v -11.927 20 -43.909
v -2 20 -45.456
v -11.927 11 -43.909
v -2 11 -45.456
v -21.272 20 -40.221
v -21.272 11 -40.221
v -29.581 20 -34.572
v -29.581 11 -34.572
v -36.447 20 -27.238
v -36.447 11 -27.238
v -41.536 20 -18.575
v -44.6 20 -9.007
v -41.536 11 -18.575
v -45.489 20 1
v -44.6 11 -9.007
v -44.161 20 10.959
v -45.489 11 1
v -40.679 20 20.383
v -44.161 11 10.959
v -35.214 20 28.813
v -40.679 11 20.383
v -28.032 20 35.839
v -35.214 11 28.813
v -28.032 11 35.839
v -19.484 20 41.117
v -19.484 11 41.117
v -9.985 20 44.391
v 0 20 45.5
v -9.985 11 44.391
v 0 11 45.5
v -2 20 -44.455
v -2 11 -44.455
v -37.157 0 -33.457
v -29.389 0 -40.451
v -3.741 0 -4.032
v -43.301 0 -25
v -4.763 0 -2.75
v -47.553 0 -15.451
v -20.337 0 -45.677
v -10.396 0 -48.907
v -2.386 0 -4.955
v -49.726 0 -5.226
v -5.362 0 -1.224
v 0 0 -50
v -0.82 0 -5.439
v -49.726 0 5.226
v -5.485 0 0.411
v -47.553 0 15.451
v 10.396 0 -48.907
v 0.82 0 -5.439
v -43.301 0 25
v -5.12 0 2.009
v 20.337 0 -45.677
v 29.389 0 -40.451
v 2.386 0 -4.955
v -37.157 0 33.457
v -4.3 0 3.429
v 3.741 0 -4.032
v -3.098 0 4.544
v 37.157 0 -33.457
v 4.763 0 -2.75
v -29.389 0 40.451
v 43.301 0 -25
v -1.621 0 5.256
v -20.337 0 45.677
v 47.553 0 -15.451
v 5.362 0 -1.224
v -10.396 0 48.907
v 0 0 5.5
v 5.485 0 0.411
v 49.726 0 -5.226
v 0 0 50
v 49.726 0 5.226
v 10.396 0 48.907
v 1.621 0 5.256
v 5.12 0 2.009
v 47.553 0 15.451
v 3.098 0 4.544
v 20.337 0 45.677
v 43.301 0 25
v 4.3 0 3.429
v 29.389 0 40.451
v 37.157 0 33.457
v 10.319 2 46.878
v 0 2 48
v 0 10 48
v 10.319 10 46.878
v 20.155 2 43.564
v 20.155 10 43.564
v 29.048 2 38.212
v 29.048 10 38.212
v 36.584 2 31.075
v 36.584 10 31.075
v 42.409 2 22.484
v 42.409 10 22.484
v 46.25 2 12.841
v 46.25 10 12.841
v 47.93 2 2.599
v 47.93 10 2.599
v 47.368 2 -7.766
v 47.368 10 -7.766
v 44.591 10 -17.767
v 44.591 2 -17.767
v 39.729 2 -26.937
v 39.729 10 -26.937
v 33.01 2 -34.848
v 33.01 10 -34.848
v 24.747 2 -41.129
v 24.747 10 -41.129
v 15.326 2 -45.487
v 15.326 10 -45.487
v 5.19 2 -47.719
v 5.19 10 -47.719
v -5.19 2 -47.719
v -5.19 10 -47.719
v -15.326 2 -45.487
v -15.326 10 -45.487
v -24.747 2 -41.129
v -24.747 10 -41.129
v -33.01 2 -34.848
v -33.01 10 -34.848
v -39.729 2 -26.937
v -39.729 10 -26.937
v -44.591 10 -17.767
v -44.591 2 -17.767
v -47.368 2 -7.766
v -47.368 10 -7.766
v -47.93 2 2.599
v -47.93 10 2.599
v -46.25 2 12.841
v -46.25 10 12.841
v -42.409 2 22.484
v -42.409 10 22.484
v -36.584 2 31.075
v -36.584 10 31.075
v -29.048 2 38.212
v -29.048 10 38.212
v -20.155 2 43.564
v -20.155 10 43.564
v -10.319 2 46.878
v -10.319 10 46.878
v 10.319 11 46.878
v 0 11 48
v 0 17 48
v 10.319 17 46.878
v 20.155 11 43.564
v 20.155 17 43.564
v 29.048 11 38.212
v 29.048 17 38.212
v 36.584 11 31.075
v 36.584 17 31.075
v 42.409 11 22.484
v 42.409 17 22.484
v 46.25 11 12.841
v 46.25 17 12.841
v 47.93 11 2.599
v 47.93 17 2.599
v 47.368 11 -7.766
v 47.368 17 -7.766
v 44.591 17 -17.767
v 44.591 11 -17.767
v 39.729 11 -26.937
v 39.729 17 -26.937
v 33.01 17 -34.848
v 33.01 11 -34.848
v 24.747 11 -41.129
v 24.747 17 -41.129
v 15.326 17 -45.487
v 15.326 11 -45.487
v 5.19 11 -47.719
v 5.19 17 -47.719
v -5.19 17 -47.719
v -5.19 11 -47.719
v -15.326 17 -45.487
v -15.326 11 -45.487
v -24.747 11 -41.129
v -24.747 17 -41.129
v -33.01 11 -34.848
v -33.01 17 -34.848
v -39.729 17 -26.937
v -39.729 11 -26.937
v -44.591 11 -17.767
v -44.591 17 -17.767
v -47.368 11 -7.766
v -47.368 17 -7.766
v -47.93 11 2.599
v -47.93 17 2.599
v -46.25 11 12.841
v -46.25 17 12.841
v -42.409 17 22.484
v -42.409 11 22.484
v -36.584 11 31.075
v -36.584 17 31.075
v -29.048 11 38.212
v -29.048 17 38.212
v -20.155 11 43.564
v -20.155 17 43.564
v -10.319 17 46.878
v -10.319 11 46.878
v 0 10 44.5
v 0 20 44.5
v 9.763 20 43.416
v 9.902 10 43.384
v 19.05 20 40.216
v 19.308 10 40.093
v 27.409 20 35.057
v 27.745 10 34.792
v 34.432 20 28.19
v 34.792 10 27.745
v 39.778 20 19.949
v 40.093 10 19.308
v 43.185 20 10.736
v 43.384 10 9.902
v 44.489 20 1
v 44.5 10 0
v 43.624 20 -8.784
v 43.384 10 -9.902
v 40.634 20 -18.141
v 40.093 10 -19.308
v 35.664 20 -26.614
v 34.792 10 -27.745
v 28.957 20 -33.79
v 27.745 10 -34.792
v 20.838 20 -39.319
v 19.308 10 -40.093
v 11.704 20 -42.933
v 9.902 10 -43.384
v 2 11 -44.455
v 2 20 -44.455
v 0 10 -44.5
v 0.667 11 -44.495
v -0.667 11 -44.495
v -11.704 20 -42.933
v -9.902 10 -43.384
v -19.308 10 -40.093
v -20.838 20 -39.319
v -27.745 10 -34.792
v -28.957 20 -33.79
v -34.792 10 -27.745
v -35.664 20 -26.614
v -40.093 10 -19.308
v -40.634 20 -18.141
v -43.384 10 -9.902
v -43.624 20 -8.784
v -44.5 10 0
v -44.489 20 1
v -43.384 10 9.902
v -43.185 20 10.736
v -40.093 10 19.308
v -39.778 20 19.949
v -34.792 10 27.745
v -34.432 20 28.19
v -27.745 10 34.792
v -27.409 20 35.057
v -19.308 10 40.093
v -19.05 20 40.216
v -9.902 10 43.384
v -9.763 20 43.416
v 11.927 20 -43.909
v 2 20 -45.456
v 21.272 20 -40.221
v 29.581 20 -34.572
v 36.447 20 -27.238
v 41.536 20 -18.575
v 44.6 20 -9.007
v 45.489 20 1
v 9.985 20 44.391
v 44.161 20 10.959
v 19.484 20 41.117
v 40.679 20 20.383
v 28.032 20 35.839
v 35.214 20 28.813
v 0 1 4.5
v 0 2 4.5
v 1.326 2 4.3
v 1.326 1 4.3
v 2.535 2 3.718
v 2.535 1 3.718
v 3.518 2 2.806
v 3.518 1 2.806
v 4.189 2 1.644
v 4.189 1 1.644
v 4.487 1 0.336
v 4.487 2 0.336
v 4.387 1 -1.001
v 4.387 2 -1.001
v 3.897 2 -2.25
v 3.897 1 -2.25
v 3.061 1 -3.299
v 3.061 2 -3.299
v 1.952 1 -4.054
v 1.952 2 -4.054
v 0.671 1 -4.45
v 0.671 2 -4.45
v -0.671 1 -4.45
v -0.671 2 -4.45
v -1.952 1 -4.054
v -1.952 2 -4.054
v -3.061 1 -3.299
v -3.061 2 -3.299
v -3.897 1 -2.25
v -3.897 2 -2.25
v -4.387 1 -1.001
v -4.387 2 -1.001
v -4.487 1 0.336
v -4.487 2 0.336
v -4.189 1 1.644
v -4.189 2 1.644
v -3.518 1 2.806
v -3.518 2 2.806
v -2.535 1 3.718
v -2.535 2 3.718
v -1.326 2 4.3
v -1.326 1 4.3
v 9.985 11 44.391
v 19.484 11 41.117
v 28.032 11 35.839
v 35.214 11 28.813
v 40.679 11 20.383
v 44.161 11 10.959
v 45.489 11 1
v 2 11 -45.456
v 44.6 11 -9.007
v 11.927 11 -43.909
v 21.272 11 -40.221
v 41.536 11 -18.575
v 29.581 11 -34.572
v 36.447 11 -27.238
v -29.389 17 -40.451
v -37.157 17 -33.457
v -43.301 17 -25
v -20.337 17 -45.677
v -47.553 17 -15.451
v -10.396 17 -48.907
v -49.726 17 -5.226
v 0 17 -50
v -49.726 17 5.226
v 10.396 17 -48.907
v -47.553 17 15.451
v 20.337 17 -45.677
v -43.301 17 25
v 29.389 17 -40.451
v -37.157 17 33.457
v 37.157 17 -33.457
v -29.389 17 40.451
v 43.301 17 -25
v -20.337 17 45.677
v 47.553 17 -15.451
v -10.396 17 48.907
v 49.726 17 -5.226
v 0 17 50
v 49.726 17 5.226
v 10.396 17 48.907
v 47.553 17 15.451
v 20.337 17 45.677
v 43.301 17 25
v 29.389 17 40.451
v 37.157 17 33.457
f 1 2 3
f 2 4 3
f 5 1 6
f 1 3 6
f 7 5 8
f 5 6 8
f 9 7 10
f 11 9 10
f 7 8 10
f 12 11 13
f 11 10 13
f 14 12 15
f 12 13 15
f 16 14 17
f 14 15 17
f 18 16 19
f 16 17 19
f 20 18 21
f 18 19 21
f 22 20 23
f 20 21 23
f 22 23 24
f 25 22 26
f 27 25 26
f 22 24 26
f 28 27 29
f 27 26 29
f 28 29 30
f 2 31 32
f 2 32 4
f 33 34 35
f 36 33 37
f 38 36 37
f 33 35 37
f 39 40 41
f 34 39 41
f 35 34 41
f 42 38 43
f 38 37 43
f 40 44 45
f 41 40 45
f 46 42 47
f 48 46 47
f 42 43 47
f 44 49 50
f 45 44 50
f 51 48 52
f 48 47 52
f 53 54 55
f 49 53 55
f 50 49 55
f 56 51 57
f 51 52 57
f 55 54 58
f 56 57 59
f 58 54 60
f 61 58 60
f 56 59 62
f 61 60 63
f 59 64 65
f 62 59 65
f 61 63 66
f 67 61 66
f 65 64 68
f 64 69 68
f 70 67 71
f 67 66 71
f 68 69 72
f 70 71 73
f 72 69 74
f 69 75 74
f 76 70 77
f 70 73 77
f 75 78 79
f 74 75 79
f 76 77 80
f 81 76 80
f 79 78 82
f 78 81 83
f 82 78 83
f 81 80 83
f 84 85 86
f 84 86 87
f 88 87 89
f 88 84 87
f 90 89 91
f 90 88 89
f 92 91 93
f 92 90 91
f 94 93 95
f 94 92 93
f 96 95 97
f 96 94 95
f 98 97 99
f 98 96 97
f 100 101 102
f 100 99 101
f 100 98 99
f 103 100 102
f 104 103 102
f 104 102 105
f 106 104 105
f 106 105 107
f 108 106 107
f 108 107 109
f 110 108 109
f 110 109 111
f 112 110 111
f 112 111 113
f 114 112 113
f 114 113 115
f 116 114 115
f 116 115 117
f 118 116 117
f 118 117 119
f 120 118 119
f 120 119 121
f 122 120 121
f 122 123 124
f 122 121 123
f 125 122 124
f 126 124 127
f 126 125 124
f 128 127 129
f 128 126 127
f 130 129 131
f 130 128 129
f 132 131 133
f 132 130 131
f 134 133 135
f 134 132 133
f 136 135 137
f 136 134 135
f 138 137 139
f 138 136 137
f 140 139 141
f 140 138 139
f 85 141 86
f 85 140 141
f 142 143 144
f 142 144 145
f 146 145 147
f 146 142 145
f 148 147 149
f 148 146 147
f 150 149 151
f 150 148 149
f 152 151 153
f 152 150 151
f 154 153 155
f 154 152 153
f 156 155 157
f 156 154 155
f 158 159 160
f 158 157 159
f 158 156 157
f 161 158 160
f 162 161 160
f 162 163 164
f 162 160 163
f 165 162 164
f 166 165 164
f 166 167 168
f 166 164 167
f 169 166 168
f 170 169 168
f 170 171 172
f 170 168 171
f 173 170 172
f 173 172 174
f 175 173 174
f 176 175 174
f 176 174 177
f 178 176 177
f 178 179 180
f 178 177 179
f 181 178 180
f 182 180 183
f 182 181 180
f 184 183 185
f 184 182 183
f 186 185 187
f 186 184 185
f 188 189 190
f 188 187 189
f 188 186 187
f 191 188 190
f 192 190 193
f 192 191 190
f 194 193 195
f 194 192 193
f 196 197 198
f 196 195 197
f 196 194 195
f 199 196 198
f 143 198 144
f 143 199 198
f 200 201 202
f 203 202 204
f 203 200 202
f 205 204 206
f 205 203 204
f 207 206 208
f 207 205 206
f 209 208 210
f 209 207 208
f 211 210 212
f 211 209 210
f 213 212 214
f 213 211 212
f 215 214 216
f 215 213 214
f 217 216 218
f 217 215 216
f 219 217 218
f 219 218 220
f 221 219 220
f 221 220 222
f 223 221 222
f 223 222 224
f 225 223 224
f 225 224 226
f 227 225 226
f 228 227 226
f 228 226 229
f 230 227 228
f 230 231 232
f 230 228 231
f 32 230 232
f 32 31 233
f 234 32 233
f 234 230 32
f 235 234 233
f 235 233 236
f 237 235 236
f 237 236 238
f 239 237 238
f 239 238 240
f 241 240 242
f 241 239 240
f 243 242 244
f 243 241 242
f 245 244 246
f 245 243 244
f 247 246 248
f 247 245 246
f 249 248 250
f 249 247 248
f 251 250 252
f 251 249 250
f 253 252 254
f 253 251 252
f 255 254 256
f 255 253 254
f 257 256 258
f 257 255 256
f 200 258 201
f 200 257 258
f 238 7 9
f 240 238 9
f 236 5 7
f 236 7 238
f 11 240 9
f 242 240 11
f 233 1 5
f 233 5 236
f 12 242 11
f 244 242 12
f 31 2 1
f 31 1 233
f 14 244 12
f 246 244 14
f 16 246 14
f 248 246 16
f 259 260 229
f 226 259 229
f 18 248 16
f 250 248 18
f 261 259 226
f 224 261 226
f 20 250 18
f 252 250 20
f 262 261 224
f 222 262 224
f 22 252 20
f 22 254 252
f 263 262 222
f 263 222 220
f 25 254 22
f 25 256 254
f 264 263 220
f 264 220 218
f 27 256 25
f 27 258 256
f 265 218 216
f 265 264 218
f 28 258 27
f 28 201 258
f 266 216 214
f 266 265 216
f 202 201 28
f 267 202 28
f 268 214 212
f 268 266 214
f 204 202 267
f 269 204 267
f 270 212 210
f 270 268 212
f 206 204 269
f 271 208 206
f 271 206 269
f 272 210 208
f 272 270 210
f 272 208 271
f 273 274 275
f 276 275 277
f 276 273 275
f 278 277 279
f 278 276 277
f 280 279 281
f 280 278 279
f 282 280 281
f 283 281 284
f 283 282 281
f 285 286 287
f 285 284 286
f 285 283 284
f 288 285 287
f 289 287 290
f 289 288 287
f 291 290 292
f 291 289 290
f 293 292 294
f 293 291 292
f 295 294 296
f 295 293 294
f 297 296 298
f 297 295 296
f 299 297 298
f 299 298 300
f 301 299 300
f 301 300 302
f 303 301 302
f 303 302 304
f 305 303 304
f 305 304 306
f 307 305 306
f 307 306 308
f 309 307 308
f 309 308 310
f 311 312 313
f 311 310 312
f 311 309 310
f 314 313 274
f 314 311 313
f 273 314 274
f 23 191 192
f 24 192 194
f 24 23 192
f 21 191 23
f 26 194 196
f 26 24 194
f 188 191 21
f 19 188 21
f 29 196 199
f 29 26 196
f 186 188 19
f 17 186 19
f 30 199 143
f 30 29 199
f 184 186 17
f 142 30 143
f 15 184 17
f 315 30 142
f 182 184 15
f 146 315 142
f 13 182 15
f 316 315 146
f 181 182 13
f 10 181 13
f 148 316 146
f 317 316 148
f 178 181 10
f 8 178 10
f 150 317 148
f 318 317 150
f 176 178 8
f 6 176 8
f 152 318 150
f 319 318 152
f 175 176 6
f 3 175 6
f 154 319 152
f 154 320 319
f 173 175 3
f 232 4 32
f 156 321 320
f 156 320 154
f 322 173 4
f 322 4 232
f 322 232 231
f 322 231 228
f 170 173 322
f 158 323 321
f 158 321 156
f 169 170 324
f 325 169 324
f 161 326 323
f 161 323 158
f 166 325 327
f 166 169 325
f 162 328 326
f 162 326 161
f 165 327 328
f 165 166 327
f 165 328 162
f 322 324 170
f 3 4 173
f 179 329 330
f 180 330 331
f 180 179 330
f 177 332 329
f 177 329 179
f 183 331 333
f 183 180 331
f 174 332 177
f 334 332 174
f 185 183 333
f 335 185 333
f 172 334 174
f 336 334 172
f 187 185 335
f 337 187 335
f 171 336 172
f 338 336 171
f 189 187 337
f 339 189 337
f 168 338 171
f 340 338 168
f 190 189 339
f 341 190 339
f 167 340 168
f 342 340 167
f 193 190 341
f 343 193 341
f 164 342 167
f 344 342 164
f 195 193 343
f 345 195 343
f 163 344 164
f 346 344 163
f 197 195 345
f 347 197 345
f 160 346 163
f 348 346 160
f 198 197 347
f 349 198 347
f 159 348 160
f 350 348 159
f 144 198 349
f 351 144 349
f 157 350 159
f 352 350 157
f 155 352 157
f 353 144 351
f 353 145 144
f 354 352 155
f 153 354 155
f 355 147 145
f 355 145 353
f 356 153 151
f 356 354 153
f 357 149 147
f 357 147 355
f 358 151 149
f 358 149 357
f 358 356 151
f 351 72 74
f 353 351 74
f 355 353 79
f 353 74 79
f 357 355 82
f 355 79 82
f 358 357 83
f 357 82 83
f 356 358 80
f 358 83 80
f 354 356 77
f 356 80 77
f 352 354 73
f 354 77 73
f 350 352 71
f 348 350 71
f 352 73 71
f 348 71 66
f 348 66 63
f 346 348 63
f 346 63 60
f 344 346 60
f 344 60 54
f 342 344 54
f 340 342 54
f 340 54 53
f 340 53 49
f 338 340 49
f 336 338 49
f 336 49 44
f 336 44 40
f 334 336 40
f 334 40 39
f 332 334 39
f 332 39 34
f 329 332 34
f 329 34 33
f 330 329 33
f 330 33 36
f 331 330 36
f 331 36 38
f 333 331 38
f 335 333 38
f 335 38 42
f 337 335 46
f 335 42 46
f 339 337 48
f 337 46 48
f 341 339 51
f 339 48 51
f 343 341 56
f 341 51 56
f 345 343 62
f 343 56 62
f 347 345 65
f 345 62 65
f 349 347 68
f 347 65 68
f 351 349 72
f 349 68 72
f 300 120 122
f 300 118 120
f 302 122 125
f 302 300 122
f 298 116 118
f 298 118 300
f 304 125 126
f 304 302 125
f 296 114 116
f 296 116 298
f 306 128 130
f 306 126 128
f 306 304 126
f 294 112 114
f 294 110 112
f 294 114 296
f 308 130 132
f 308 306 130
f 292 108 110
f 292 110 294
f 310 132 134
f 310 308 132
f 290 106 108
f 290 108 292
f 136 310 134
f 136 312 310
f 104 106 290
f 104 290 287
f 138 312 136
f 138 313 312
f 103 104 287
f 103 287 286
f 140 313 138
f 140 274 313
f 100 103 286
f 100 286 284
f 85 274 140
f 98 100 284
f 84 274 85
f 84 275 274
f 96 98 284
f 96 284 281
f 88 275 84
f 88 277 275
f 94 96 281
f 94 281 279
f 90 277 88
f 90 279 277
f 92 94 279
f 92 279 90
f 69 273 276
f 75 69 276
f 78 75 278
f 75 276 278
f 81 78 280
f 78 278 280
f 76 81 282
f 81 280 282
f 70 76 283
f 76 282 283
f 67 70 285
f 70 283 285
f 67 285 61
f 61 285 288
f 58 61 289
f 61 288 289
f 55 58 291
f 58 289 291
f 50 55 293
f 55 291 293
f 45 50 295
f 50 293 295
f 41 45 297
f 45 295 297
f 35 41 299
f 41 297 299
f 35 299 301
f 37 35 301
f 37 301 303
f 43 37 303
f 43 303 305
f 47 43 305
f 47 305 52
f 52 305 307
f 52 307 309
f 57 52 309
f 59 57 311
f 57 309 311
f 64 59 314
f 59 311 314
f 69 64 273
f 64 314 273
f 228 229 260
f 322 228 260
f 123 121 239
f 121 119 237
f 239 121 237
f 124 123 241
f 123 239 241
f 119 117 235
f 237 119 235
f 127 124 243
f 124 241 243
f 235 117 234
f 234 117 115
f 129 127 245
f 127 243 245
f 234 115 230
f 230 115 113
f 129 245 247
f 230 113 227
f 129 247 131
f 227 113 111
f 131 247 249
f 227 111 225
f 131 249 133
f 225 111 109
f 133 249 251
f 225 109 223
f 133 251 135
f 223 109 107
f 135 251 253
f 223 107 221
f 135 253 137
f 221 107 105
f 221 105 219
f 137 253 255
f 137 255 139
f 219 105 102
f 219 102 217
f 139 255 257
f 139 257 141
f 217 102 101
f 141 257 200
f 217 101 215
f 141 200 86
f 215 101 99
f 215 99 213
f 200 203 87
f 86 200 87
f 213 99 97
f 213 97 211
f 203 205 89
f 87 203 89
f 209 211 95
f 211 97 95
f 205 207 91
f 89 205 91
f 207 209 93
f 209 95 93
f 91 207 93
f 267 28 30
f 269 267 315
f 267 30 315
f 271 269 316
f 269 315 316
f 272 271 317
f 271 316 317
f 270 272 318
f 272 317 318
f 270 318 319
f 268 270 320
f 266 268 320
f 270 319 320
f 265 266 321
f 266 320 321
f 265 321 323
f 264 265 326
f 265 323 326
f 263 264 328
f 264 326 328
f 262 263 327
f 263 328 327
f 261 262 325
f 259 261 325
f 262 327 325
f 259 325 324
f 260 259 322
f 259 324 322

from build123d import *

# Parameters (mm, degrees)
ESQUISSE1_R             = 50
BOSS_EXTRU_1_DEPTH      = 17
COQUE1_T                = -2
ESQUISSE2_R             = 4.5
ENL_V_MAT_EXTRU_3_DEPTH = 73.725511342
CHANFREIN1_SIZE         = 1
ESQUISSE3_R             = 50
ESQUISSE3_R_2           = 44.5
BOSS_EXTRU_2_DEPTH      = 1
ESQUISSE4_R             = 45.5
ESQUISSE4_R_2           = 44.5
BOSS_EXTRU_3_DEPTH      = 10
ESQUISSE5_W             = 4
ESQUISSE5_H             = 2.5
ENL_V_MAT_EXTRU_4_DEPTH = 9


with BuildPart() as part:
    # Esquisse1 → Boss.-Extru.1 (new body)
    with BuildSketch(Plane(origin=(0, 0, 0), x_dir=(1, 0, 0), z_dir=(0, 1, 0))):
        with Locations(Location((0, 0, 0), (0, 0, 270))):
            Circle(ESQUISSE1_R)
    extrude(amount=BOSS_EXTRU_1_DEPTH)

    # Coque1
    coque1_openings = [part.faces().sort_by_distance(p)[0] for p in [
        (0, 17, 0),
    ]]
    offset(amount=COQUE1_T, openings=coque1_openings, kind=Kind.INTERSECTION)

    # Esquisse2 → Enlèv. mat.-Extru.3 (cut, through all)
    with BuildSketch(Plane(origin=(0, 0, 0), x_dir=(1, 0, 0), z_dir=(0, 1, 0))):
        with Locations(Location((0, 0, 0), (0, 0, 270))):
            Circle(ESQUISSE2_R)
    extrude(amount=ENL_V_MAT_EXTRU_3_DEPTH, mode=Mode.SUBTRACT)

    # Chanfrein1
    chanfrein1_edges = [part.edges().sort_by_distance(p)[0] for p in [
        (0, 0, -4.5),
    ]]
    chamfer(chanfrein1_edges, length=CHANFREIN1_SIZE)

    # Esquisse3 → Boss.-Extru.2 (add)
    with BuildSketch(Plane(origin=(0, 10, 0), x_dir=(1, 0, 0), z_dir=(0, 1, 0))):
        with Locations(Location((0, 0, 0), (0, 0, 270))):
            Circle(ESQUISSE3_R)
        with Locations(Location((0, 0, 0), (0, 0, 270))):
            Circle(ESQUISSE3_R_2, mode=Mode.SUBTRACT)
    extrude(amount=BOSS_EXTRU_2_DEPTH)

    # Esquisse4 → Boss.-Extru.3 (add)
    with BuildSketch(Plane(origin=(0, 10, 0), x_dir=(1, 0, 0), z_dir=(0, 1, 0))):
        with Locations(Location((0, 0, 0), (0, 0, 270))):
            Circle(ESQUISSE4_R)
        with Locations(Location((0, 0, 0), (0, 0, 270))):
            Circle(ESQUISSE4_R_2, mode=Mode.SUBTRACT)
    extrude(amount=BOSS_EXTRU_3_DEPTH)

    # Esquisse5 → Enlèv. mat.-Extru.4 (cut)
    with BuildSketch(Plane(origin=(0, 20, 0), x_dir=(1, 0, 0), z_dir=(0, 1, 0))):
        with Locations((0, 45.25)):
            Rectangle(ESQUISSE5_W, ESQUISSE5_H)
    extrude(amount=-ENL_V_MAT_EXTRU_4_DEPTH, mode=Mode.SUBTRACT)


solid = part.part
